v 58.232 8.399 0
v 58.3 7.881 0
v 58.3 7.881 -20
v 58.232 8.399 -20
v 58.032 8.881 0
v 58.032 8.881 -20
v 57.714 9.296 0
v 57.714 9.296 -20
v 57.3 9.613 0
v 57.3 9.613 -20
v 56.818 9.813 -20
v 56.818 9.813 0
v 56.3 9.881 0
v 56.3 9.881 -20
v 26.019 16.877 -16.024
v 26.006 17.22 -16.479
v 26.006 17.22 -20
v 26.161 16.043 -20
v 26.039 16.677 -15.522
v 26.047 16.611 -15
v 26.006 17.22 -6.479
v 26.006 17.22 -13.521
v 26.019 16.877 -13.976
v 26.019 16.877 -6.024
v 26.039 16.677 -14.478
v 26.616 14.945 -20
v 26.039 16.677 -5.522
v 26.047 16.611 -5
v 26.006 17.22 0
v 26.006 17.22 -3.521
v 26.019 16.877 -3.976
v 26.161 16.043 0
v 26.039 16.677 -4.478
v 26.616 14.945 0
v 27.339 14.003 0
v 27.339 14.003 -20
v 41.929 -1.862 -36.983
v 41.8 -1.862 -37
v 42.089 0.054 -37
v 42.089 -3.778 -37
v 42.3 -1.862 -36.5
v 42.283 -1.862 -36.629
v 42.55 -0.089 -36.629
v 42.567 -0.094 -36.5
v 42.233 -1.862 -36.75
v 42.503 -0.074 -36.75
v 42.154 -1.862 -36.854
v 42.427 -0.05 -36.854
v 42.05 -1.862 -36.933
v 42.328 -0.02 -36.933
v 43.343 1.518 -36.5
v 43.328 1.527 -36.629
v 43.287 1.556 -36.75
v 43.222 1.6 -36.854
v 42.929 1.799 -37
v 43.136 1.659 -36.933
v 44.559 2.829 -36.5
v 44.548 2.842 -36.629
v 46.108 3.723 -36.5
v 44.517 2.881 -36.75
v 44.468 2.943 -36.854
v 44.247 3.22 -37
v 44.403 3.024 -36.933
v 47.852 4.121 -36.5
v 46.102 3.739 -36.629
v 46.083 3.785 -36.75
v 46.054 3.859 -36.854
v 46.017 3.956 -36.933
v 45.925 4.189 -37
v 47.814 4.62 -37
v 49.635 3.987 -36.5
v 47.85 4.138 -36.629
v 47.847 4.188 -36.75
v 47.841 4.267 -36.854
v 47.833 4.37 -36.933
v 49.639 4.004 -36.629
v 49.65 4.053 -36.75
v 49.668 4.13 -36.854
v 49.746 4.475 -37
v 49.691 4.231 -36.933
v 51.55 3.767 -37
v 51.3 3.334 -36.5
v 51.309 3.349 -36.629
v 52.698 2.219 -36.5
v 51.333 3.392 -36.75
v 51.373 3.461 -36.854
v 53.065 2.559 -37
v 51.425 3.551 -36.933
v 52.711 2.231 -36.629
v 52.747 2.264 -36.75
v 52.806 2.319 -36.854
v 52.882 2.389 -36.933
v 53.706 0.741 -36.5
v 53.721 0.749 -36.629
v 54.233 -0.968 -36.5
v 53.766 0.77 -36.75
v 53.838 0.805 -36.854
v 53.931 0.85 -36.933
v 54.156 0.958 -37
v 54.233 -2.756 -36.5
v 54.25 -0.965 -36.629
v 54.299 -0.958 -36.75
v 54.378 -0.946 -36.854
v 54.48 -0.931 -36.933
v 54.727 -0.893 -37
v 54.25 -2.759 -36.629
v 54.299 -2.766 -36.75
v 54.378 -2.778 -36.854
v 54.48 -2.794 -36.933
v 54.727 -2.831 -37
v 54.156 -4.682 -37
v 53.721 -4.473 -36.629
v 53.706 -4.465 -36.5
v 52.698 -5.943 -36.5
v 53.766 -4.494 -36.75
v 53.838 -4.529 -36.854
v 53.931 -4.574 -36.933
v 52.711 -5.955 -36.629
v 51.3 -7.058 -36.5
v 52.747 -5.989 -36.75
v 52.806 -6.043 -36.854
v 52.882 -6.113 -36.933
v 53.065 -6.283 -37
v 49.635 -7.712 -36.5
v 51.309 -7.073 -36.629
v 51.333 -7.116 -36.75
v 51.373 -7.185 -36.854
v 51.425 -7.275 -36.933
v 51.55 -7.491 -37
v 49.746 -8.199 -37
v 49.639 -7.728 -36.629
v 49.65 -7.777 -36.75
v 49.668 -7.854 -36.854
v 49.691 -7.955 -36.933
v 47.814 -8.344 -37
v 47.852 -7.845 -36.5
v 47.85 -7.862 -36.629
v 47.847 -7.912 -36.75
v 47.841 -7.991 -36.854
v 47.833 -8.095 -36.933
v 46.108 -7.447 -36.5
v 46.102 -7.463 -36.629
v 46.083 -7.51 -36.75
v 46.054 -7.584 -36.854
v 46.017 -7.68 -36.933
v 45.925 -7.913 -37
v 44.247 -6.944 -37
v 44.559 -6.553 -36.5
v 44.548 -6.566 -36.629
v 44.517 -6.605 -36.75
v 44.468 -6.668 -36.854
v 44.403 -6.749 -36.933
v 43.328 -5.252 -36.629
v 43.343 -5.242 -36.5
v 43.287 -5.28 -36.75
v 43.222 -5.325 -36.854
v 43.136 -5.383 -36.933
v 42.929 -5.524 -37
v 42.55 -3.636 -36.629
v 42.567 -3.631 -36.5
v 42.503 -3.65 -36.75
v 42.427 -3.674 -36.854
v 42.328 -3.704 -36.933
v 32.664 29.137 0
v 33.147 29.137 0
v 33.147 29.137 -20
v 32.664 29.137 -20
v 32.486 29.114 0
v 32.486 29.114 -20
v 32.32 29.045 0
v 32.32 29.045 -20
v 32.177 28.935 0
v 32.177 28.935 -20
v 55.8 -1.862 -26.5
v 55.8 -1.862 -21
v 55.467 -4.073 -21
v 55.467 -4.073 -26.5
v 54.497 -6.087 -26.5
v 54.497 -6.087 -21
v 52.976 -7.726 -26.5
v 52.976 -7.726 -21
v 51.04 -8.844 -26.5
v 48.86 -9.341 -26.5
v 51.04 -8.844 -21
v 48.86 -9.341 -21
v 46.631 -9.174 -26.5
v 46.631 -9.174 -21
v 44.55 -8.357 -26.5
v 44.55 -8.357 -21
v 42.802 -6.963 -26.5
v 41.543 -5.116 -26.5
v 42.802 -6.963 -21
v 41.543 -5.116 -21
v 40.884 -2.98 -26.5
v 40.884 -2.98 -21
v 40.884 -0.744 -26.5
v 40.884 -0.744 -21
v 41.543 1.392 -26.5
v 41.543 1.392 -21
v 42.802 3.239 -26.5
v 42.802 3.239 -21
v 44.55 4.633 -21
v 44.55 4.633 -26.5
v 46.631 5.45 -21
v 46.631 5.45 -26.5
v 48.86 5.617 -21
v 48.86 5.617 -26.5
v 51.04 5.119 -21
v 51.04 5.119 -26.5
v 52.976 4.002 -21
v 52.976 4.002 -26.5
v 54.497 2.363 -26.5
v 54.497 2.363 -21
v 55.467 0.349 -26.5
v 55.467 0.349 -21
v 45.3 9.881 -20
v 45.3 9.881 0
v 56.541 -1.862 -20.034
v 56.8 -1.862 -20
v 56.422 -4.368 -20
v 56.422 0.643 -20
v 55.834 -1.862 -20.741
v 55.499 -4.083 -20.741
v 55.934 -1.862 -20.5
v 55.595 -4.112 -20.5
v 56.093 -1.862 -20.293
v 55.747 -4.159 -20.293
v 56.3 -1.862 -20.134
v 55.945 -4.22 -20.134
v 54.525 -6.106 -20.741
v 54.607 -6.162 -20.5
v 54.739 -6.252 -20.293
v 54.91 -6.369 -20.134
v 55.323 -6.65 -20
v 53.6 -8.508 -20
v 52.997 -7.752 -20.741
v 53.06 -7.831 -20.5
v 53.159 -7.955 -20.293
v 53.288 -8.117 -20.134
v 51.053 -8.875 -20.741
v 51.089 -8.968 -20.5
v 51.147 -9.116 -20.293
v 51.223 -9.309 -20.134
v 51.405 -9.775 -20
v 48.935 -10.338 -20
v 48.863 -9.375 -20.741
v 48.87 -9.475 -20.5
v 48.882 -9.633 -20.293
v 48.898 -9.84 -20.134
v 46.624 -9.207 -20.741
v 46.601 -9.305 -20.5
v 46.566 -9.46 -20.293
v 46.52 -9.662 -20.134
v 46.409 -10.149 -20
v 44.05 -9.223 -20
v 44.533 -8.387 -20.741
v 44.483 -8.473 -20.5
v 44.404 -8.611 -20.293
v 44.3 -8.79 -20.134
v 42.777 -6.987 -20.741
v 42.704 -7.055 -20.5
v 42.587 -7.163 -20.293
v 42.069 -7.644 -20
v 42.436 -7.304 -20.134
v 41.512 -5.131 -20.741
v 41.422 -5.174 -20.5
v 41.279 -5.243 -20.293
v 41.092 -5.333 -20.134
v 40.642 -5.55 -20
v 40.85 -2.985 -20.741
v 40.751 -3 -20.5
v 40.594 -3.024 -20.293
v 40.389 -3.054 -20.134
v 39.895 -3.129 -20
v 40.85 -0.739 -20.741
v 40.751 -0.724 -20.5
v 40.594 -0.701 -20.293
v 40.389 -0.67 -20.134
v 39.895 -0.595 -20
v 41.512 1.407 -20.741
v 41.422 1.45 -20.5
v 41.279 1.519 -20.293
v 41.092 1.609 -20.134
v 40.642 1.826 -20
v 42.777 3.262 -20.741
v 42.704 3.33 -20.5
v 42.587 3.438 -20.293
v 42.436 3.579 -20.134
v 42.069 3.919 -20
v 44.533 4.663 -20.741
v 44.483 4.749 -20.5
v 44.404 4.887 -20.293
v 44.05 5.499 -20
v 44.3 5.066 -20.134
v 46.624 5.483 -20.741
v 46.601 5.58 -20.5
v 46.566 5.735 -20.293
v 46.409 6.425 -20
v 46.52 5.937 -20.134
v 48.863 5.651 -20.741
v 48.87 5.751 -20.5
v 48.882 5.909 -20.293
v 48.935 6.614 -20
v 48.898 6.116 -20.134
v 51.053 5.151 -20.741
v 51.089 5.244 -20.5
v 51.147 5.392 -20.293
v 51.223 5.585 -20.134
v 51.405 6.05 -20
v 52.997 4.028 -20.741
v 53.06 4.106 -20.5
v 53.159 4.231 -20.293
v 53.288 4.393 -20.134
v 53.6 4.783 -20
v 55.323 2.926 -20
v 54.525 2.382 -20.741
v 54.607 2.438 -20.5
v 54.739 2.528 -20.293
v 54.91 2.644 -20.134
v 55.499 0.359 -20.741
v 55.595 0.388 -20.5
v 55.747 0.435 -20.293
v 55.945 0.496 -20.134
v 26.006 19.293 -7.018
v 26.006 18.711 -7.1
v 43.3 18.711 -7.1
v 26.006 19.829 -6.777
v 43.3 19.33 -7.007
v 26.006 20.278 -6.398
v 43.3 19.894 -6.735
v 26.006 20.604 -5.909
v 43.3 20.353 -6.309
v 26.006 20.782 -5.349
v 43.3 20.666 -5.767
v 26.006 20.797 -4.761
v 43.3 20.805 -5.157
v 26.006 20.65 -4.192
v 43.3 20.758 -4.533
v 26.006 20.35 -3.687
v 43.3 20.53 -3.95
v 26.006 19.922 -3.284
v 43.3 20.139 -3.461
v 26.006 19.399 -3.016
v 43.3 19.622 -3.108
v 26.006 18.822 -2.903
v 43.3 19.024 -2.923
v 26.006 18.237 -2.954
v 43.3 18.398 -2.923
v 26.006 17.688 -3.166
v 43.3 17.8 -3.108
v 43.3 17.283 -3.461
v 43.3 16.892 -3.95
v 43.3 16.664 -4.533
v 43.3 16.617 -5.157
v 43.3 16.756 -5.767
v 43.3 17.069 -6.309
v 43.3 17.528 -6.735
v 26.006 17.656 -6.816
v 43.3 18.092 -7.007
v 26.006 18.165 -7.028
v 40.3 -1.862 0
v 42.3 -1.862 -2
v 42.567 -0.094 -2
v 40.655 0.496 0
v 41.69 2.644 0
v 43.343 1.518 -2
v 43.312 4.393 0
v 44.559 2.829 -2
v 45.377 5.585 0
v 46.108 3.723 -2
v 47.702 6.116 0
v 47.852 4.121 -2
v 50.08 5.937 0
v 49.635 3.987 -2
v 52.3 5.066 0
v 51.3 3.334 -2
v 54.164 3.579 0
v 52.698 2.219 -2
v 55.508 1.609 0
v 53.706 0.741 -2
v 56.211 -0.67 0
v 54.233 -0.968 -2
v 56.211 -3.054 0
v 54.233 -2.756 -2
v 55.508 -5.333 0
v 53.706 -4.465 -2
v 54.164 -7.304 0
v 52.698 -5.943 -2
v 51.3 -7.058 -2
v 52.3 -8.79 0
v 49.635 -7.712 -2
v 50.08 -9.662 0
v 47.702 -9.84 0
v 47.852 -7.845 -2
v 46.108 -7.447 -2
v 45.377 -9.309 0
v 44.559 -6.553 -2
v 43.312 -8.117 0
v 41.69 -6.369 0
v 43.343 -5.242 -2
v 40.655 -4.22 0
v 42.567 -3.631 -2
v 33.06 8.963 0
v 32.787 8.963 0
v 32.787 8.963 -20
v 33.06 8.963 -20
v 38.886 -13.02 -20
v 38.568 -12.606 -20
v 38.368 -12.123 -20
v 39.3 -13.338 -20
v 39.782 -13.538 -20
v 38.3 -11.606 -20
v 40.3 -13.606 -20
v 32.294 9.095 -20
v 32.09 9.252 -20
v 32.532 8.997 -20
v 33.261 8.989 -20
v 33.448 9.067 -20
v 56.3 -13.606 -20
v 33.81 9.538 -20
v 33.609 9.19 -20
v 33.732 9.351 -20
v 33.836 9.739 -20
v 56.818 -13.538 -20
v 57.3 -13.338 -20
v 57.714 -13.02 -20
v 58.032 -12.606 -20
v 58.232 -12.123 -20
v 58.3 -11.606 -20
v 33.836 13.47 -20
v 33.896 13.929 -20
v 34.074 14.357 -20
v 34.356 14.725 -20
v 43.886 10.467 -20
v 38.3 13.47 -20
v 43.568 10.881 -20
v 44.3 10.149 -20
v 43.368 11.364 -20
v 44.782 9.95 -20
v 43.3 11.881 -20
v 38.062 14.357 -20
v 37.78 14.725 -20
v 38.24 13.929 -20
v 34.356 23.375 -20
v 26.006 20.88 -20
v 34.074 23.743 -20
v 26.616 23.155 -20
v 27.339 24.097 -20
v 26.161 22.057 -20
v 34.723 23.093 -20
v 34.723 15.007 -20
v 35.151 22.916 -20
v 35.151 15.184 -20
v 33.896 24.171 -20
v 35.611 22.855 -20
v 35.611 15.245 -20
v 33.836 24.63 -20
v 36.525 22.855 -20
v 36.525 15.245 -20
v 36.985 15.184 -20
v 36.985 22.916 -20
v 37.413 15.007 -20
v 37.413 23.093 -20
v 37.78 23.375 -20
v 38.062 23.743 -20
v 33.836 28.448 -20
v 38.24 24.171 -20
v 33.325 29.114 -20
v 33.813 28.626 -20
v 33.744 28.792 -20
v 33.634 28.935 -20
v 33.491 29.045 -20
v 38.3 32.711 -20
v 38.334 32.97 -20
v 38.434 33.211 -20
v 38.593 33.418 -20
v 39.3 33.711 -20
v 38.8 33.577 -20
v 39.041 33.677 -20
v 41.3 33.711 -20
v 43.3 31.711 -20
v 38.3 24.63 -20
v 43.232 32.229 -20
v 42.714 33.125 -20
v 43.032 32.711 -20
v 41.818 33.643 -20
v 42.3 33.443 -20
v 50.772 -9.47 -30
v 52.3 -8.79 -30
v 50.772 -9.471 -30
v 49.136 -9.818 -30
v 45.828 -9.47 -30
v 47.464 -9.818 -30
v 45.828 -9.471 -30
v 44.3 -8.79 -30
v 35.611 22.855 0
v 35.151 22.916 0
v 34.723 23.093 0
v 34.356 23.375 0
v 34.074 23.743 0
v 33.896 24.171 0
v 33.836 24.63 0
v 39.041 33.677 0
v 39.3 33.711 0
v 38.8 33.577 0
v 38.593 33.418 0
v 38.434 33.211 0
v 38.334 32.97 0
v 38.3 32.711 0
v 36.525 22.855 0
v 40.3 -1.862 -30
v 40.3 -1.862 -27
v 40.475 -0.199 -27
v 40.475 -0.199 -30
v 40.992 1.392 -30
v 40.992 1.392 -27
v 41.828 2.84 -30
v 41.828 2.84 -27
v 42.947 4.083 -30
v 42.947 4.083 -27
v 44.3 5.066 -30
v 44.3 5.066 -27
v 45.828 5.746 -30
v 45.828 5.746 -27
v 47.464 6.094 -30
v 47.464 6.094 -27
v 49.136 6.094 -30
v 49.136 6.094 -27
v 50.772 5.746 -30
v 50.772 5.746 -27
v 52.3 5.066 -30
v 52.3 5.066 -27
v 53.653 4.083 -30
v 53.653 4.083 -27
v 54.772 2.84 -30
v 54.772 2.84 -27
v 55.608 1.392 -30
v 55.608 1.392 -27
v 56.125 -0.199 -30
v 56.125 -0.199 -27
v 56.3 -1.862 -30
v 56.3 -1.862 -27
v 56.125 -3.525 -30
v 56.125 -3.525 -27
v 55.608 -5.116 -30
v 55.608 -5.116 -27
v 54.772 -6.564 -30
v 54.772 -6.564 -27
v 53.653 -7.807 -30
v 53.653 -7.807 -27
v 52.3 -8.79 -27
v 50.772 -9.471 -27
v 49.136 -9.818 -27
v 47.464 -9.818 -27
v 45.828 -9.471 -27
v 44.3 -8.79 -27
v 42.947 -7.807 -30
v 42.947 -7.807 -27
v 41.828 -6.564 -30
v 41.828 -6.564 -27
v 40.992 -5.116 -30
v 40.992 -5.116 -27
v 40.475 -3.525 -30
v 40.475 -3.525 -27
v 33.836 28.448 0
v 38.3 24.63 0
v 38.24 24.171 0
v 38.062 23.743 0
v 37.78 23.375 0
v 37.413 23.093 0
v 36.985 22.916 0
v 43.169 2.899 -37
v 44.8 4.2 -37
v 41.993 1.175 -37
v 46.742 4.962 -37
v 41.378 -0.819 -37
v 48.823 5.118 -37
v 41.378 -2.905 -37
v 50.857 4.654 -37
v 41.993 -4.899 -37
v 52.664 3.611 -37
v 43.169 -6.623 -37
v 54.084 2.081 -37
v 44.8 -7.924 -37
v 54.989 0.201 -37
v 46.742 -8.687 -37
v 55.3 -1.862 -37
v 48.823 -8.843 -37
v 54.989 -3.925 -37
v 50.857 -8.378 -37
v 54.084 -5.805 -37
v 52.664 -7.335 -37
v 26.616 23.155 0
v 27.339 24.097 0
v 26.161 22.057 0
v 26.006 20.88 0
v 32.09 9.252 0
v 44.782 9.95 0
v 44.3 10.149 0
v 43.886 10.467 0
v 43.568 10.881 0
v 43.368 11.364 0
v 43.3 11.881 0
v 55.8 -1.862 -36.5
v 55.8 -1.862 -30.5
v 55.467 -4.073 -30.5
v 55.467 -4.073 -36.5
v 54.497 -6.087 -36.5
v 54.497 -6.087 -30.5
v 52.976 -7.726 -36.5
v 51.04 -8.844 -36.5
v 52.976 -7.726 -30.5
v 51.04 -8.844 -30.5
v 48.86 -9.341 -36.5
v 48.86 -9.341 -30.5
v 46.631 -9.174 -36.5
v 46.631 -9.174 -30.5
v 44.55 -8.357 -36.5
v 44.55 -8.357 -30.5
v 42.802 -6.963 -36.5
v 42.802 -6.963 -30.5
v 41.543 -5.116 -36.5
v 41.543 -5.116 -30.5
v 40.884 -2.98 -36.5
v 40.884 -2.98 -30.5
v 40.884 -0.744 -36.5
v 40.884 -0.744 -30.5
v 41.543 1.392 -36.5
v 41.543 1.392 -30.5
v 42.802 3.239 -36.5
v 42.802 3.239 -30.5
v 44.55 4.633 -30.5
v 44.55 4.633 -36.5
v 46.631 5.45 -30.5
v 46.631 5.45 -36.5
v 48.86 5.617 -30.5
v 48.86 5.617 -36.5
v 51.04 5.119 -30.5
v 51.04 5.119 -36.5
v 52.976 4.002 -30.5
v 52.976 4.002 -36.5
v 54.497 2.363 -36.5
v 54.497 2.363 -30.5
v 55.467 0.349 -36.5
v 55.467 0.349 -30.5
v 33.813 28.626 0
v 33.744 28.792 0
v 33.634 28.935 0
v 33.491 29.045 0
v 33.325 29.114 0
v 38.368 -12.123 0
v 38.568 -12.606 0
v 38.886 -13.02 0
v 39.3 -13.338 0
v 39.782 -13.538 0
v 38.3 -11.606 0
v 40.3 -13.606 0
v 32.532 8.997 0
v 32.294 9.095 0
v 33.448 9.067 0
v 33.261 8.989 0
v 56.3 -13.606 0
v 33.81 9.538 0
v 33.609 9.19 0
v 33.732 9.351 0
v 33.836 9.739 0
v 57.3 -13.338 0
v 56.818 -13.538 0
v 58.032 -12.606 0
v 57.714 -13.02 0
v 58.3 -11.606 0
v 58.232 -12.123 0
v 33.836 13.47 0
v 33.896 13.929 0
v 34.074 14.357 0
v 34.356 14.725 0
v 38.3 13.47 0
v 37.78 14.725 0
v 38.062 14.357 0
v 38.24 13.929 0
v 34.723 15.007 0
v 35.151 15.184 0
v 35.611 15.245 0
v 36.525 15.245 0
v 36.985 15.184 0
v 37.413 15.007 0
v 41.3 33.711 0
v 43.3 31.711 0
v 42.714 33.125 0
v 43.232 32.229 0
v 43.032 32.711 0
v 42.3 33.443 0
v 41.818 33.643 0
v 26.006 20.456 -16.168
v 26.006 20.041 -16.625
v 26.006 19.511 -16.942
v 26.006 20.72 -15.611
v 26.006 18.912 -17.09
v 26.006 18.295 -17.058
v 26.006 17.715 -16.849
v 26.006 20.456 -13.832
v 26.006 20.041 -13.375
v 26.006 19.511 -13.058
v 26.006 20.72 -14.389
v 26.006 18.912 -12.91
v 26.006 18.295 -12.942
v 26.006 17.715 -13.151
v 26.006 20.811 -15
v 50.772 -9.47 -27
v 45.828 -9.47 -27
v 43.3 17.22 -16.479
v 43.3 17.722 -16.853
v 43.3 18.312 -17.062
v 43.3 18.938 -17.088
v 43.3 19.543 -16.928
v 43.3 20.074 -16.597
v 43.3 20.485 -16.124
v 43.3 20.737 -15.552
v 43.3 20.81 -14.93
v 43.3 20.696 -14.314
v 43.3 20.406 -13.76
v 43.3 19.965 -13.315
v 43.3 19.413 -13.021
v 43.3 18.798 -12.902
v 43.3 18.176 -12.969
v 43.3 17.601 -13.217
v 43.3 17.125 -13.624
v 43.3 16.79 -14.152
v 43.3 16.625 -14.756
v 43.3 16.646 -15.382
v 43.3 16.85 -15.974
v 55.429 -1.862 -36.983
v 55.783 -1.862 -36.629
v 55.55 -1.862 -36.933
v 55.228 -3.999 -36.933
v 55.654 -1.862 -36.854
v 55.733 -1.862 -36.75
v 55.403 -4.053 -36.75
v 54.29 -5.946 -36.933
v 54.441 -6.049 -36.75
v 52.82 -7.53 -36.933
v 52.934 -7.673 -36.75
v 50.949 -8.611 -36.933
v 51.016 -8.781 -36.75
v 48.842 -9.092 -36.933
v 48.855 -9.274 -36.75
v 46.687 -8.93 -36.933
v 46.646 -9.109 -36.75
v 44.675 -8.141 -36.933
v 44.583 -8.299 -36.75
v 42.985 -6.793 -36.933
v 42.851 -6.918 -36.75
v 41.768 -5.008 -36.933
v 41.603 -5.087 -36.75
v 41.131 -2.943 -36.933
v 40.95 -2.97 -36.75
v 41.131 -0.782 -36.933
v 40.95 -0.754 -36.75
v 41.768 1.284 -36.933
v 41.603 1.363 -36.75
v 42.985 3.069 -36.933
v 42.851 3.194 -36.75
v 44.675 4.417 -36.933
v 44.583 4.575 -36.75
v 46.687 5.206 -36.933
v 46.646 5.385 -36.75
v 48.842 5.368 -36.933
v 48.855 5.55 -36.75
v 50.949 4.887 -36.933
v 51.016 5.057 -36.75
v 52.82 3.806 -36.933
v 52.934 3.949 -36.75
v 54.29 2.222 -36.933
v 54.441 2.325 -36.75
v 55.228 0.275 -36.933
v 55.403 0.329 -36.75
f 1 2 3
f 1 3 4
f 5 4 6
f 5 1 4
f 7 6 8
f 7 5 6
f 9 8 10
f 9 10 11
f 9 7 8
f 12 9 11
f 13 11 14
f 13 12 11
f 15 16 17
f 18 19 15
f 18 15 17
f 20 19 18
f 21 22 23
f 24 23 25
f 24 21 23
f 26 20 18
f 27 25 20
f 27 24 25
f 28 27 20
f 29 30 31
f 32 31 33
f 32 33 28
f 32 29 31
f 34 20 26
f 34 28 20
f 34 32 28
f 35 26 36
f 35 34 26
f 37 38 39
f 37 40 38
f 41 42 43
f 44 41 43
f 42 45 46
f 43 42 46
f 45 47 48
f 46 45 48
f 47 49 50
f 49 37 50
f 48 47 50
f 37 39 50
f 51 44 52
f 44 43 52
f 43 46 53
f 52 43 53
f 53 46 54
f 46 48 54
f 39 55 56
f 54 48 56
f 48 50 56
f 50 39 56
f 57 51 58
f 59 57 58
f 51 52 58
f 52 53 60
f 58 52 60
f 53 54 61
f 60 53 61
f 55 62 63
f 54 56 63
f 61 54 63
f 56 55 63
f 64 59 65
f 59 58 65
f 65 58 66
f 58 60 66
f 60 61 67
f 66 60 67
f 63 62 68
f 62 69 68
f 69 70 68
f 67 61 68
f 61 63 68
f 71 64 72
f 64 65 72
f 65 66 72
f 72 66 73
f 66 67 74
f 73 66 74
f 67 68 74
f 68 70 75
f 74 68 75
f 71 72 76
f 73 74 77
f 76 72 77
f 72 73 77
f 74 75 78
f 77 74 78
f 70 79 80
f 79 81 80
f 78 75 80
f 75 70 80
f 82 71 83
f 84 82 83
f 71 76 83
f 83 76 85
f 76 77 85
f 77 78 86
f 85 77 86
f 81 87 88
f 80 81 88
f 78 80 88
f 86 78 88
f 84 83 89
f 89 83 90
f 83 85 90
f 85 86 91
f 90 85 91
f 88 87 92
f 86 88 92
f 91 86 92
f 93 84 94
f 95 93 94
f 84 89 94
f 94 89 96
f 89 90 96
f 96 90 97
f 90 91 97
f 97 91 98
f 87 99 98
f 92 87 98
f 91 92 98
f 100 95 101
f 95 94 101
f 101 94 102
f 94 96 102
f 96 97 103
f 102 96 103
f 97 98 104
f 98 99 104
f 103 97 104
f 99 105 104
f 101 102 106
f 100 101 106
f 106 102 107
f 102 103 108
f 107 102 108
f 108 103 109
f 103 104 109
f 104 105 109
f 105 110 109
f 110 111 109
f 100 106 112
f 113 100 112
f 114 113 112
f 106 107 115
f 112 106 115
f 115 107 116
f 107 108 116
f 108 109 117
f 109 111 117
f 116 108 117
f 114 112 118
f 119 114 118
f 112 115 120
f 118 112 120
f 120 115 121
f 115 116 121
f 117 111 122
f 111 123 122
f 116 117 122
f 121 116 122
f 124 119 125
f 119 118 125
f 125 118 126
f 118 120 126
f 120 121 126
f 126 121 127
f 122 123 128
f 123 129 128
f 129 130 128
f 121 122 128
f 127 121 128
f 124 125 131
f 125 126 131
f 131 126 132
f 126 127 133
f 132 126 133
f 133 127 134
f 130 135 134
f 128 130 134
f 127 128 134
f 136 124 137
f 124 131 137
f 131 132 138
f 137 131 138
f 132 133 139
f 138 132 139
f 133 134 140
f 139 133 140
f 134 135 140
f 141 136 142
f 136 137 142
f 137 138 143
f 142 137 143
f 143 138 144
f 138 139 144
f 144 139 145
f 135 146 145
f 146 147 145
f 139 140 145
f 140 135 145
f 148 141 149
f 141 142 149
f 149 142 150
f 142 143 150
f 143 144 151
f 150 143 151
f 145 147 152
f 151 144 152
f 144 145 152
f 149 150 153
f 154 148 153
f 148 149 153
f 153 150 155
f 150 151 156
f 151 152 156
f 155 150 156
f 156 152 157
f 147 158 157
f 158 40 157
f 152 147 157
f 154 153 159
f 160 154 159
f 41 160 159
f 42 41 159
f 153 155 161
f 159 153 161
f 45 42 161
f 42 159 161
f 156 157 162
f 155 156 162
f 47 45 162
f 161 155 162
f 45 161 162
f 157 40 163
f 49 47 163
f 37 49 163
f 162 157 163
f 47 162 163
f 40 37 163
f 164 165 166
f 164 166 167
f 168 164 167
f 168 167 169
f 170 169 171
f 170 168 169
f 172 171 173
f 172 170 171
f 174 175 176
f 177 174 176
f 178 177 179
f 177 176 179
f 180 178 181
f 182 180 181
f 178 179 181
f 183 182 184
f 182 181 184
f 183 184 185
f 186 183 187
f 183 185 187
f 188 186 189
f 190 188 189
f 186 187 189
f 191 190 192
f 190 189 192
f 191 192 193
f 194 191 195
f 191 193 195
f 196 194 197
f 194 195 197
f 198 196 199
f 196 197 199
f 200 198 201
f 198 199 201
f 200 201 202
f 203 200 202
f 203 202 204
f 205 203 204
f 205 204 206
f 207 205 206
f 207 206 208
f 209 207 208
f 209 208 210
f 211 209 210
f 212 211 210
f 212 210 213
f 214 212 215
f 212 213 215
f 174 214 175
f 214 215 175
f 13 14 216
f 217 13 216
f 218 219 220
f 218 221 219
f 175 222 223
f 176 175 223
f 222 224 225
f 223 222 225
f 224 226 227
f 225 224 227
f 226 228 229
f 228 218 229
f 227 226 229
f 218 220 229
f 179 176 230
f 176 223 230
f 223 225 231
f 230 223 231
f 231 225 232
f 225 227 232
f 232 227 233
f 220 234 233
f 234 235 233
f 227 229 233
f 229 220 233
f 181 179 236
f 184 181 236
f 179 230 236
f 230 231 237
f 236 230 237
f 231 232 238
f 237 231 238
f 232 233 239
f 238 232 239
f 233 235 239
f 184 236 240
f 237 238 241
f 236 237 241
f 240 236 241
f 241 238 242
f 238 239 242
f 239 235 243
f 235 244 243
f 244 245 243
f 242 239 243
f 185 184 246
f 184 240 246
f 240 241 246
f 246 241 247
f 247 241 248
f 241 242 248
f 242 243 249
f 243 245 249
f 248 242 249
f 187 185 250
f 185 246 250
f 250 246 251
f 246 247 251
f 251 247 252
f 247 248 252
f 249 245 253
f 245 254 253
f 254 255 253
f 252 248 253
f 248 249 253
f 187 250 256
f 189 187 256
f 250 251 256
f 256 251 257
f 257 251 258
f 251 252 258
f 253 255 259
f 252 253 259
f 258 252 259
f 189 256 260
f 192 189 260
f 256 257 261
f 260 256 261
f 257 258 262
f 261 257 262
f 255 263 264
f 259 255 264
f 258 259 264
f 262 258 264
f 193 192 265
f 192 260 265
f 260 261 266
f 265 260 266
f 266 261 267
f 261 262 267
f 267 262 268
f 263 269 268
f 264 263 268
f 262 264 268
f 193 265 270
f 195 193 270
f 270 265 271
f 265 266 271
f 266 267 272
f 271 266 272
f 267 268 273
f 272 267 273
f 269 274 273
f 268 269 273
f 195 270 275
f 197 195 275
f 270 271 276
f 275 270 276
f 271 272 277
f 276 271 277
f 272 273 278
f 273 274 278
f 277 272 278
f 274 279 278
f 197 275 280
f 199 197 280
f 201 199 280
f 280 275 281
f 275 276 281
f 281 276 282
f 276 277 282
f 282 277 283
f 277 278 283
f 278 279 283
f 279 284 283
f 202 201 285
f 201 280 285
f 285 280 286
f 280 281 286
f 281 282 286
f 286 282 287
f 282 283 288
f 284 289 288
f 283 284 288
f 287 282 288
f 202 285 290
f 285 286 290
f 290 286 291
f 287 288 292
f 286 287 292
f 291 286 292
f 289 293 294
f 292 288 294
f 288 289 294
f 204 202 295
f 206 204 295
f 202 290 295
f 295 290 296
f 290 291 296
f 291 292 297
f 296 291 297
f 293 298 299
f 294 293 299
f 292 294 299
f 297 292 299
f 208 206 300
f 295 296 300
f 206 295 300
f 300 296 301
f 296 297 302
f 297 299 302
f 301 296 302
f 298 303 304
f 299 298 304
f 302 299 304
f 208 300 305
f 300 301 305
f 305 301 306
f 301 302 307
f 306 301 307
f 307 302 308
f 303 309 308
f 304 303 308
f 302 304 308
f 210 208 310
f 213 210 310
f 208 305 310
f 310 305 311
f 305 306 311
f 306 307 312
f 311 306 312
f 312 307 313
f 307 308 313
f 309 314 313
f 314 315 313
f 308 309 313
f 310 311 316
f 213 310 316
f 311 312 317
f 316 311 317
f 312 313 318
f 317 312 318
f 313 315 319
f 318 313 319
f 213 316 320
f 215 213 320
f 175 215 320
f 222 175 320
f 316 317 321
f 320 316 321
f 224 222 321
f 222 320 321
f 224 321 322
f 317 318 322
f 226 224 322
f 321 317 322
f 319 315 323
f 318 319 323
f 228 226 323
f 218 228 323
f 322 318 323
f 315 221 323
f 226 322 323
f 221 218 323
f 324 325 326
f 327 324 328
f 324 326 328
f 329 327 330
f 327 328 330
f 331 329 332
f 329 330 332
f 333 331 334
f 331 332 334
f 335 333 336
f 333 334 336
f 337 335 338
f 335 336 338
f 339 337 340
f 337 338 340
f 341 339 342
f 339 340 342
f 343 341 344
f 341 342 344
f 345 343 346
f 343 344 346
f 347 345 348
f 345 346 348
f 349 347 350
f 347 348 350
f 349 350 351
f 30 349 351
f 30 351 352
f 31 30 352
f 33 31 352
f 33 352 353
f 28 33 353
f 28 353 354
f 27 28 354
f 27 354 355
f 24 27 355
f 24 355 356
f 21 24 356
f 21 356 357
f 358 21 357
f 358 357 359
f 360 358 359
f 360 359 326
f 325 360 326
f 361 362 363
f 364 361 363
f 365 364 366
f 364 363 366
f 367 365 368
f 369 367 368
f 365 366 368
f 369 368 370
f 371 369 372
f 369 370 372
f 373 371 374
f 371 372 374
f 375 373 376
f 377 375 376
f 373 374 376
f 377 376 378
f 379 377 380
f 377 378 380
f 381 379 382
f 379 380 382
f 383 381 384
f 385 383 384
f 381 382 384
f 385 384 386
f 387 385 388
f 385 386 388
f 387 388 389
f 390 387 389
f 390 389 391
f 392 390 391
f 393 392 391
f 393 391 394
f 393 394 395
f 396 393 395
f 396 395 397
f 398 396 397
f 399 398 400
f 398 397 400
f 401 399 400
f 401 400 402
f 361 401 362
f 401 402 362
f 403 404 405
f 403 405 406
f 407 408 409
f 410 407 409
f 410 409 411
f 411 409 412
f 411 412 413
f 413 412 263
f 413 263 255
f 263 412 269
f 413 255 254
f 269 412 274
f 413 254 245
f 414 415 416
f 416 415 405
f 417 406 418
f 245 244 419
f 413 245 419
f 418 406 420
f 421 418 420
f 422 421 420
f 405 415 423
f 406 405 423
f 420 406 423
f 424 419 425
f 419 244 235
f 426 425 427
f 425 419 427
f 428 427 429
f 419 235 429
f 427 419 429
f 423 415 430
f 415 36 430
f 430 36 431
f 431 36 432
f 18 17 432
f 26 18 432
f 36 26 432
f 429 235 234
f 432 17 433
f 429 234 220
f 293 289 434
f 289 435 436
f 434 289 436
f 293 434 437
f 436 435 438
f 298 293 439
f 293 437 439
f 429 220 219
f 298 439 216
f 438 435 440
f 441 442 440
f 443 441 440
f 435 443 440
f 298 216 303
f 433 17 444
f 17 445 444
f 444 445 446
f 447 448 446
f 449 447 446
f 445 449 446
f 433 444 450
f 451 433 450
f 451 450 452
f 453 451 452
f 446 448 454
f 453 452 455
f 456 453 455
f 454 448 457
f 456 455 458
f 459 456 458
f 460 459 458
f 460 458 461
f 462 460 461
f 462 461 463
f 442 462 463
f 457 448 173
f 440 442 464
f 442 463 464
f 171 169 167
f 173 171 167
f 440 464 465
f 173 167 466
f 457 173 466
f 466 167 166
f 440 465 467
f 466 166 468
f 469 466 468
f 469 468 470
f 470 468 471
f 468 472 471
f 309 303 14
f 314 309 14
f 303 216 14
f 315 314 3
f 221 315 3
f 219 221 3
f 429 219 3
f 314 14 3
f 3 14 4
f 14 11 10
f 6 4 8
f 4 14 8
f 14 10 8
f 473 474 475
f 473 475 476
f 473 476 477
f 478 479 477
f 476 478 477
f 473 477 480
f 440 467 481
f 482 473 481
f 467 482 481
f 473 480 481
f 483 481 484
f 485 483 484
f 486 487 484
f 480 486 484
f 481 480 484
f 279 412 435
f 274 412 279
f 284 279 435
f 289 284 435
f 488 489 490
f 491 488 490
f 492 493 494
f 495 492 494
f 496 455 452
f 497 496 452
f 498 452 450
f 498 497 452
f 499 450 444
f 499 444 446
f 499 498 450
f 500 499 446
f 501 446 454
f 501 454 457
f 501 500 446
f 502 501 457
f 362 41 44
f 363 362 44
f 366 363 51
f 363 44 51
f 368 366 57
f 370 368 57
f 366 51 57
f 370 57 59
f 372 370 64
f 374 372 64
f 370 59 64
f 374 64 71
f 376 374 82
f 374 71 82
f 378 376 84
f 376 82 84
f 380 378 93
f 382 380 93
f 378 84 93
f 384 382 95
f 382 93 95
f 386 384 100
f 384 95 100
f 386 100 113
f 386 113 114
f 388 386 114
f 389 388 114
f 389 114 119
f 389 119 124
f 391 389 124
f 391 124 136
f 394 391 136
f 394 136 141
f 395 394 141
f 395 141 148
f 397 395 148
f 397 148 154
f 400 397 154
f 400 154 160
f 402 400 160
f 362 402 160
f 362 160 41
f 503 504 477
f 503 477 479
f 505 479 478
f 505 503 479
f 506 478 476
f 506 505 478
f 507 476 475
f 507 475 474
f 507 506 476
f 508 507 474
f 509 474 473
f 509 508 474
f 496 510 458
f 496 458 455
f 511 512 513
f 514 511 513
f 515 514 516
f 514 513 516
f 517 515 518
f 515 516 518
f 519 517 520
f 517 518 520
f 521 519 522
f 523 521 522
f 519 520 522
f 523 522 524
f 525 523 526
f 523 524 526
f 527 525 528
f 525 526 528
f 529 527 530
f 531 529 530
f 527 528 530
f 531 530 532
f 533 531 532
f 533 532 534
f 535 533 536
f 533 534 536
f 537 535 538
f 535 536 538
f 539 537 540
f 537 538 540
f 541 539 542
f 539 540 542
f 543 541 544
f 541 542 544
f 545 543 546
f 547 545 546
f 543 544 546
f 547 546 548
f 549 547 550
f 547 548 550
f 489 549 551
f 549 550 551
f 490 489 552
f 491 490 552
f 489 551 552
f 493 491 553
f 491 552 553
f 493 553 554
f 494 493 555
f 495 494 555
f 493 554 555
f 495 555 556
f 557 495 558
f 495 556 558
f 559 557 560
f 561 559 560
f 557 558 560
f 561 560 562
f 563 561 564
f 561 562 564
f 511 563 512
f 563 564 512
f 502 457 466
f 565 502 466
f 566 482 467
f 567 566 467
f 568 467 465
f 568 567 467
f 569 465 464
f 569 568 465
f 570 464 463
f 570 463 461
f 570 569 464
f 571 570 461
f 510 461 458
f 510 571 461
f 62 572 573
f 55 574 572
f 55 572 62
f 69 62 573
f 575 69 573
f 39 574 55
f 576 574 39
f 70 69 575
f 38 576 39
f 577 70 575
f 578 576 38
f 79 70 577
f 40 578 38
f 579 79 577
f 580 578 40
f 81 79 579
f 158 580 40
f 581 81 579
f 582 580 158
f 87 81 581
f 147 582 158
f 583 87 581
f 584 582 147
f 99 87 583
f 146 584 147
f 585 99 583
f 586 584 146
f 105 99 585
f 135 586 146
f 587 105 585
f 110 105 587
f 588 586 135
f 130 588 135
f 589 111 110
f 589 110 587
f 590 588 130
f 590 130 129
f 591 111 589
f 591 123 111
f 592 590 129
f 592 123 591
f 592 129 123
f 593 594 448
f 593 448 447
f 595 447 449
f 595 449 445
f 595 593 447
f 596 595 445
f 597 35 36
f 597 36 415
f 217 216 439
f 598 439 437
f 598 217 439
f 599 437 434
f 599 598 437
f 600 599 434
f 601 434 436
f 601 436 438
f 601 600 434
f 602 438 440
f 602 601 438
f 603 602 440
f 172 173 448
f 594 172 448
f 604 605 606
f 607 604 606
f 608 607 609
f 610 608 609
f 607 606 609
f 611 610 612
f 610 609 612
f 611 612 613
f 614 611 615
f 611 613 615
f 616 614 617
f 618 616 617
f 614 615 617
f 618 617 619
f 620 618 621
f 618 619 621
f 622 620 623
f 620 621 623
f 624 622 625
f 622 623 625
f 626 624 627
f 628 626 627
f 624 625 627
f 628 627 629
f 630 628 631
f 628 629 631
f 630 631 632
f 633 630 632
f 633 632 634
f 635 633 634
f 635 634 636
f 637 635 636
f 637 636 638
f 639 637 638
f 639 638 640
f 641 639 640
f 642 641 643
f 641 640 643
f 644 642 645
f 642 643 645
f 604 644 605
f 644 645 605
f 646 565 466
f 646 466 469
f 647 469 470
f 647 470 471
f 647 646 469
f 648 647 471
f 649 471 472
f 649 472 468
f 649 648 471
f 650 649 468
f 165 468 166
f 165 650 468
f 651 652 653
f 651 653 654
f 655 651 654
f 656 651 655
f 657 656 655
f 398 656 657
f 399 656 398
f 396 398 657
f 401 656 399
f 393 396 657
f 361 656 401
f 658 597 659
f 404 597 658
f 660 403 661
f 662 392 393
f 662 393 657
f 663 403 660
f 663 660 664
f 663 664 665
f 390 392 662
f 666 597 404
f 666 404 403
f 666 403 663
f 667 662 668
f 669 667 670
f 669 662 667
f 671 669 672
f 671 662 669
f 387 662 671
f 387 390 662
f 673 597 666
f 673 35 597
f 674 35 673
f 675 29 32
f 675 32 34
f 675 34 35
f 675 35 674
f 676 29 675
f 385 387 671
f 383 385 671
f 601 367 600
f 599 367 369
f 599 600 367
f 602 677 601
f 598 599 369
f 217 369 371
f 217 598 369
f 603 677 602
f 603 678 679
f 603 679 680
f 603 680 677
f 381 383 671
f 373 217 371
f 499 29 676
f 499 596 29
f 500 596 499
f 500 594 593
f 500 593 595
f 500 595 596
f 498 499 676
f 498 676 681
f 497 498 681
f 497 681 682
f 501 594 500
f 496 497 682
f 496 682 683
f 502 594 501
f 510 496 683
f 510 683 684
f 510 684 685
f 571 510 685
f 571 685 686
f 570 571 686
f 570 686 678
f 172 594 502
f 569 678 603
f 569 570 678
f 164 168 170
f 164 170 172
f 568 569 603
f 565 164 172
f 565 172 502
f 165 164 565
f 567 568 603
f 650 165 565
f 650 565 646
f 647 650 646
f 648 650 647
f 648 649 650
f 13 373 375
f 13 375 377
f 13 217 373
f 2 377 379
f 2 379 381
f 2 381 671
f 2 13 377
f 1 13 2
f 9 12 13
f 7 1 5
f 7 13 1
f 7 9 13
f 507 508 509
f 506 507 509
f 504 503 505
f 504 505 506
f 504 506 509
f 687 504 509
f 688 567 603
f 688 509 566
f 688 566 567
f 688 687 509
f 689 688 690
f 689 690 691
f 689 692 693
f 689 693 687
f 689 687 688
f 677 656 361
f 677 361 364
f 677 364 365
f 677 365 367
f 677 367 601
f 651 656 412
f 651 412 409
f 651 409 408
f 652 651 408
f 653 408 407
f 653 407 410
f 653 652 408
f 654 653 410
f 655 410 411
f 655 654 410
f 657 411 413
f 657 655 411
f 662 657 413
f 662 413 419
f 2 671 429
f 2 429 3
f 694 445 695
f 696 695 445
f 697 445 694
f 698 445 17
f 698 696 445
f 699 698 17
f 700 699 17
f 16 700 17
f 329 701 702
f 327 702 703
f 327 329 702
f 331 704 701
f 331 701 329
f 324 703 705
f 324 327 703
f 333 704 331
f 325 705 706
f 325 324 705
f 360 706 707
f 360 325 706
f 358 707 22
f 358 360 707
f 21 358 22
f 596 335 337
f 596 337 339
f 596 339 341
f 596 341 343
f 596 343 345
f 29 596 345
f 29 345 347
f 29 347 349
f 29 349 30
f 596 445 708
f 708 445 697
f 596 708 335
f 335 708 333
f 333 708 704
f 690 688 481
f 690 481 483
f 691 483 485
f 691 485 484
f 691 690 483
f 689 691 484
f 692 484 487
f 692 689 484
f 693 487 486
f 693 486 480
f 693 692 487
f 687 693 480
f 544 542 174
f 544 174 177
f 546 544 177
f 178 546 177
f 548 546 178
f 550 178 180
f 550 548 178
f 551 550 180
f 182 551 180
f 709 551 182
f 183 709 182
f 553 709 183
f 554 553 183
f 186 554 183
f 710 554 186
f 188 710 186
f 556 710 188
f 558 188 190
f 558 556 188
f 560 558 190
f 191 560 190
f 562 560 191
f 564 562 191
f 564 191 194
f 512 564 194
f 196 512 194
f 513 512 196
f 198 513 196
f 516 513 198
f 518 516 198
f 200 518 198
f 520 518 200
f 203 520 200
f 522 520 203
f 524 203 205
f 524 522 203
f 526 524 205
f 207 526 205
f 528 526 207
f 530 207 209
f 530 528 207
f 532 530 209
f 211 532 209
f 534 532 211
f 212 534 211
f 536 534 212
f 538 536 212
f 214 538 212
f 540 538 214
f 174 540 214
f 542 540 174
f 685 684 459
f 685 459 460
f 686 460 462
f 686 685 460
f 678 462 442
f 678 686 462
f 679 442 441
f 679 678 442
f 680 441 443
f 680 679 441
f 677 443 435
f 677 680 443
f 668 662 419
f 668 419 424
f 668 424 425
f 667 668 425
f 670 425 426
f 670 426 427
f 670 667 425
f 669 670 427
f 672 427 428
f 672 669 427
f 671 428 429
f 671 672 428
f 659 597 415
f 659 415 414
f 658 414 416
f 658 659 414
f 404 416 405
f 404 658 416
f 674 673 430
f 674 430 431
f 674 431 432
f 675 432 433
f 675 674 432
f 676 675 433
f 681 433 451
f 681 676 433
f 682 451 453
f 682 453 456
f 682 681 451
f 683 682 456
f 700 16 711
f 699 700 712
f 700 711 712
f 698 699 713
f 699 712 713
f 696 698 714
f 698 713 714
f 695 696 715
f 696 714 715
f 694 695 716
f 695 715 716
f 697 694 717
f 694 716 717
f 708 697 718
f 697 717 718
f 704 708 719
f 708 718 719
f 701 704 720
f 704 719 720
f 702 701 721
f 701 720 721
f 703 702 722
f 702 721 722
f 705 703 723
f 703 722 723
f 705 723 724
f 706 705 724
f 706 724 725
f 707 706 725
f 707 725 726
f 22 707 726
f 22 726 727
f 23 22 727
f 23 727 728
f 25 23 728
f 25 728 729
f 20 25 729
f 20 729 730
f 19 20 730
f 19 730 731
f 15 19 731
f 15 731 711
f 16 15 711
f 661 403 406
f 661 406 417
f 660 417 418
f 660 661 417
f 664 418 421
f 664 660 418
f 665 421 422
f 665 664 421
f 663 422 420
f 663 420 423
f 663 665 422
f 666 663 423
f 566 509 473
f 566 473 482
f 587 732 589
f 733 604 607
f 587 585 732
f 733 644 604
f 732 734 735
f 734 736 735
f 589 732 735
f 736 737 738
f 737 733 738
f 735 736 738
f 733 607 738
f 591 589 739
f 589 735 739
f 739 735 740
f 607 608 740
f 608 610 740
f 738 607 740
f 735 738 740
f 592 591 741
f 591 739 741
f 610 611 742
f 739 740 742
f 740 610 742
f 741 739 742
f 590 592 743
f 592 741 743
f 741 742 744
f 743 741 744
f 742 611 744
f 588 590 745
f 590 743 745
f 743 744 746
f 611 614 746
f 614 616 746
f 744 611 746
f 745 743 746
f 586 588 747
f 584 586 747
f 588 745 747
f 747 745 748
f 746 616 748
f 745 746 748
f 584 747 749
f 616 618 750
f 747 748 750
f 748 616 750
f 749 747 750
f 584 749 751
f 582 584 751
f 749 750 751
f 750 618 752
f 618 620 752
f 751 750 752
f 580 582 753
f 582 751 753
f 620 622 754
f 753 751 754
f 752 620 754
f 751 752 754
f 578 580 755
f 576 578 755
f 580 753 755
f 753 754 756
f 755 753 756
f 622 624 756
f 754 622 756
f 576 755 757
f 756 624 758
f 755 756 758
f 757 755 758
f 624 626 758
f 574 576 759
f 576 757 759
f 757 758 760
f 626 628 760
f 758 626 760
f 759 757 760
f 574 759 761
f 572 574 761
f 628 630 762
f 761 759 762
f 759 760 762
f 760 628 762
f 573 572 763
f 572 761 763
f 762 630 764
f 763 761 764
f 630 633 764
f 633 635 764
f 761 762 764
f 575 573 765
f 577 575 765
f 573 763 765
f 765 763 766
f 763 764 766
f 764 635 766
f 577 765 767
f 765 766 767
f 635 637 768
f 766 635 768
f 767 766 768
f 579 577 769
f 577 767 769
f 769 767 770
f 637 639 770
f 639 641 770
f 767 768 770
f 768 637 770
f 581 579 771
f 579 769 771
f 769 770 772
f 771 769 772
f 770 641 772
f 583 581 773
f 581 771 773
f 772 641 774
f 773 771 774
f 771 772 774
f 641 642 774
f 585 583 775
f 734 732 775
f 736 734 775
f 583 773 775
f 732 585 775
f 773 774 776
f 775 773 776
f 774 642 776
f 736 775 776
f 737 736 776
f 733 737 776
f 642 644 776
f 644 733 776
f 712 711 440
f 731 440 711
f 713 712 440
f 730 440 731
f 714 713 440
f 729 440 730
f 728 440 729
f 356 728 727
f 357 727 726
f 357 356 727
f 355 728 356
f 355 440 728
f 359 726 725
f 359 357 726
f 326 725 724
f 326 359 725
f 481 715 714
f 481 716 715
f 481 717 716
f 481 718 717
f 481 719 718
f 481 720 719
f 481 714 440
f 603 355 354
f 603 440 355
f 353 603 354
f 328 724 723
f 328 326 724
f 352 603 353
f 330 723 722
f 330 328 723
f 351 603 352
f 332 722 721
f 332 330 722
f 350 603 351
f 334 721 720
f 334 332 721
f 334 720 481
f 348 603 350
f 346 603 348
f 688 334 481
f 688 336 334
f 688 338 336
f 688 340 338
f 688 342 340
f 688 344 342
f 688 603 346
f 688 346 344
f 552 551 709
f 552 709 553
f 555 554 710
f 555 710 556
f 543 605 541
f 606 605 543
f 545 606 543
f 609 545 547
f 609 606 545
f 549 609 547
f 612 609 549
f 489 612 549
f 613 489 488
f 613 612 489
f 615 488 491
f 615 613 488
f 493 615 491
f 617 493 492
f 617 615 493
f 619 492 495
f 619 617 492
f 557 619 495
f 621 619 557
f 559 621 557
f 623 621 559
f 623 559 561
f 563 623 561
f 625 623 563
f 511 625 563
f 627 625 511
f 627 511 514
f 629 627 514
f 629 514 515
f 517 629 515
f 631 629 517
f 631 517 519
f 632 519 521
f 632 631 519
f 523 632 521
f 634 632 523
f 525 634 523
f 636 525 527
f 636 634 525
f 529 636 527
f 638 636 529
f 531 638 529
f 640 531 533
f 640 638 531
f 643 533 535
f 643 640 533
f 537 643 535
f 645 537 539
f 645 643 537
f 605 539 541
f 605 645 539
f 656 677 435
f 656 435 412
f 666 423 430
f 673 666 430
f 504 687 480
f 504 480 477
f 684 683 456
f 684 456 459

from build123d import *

# Parameters (mm, degrees)
BOSS_EXTRUDE1_DEPTH = 20
SKETCH3_R           = 2.1
CUT_EXTRUDE1_DEPTH  = 43.842719799
SKETCH4_R           = 7.5
BOSS_EXTRUDE2_DEPTH = 7
SKETCH5_R           = 8
BOSS_EXTRUDE3_DEPTH = 3
SKETCH6_R           = 7.5
BOSS_EXTRUDE4_DEPTH = 7
SKETCH7_R           = 6
CUT_EXTRUDE2_DEPTH  = 77.839573439
FILLET1_R           = 1
CHAMFER1_SIZE       = 0.5
CHAMFER2_SIZE       = 2
FILLET2_R           = 0.5


with BuildPart() as part:
    # Sketch1 → Boss-Extrude1 (new body)
    with BuildSketch(Plane.XY):
        with BuildLine():
            Line((38.3, 10.745623604), (38.3, 9.881410941))
            Line((38.3, 9.881410941), (38.3, 5.394343623))
            Line((38.3, 5.394343623), (38.3, -11.605656377))
            ThreePointArc((38.3, -11.605656377), (38.885786438, -13.01986994), (40.3, -13.605656377))
            Line((40.3, -13.605656377), (51.3, -13.605656377))
            Line((51.3, -13.605656377), (56.3, -13.605656377))
            ThreePointArc((56.3, -13.605656377), (57.714213562, -13.01986994), (58.3, -11.605656377))
            Line((58.3, -11.605656377), (58.3, 7.881410941))
            ThreePointArc((58.3, 7.881410941), (57.714213562, 9.295624503), (56.3, 9.881410941))
            Line((56.3, 9.881410941), (45.3, 9.881410941))
            ThreePointArc((45.3, 9.881410941), (43.885786438, 10.467197379), (43.3, 11.881410941))
            Line((43.3, 11.881410941), (43.3, 31.710978016))
            ThreePointArc((43.3, 31.710978016), (42.714213562, 33.125191579), (41.3, 33.710978016))
            Line((41.3, 33.710978016), (39.3, 33.710978016))
            ThreePointArc((39.3, 33.710978016), (38.592893219, 33.418084798), (38.3, 32.710978016))
            Line((38.3, 32.710978016), (38.3, 28.215588568))
            Line((38.3, 28.215588568), (38.3, 27.353495632))
            Line((38.3, 27.353495632), (38.3, 24.630195866))
            ThreePointArc((38.3, 24.630195866), (37.780173169, 23.37522288), (36.525200183, 22.855396049))
            Line((36.525200183, 22.855396049), (35.6108, 22.855396049))
            ThreePointArc((35.6108, 22.855396049), (34.355826885, 23.375222934), (33.836, 24.630196049))
            Line((33.836, 24.630196049), (33.836, 28.448))
            ThreePointArc((33.836, 28.448), (33.634196572, 28.935196572), (33.147, 29.137))
            Line((33.147, 29.137), (32.664287242, 29.137))
            ThreePointArc((32.664287242, 29.137), (32.400617966, 29.084552836), (32.177090071, 28.935195973))
            Line((32.177090071, 28.935195973), (27.33900161, 24.097095612))
            ThreePointArc((27.33900161, 24.097095612), (26.352731832, 22.621035632), (26.0064, 20.879905136))
            Line((26.0064, 20.879905136), (26.0064, 17.220094864))
            ThreePointArc((26.0064, 17.220094864), (26.352731832, 15.478964368), (27.33900161, 14.002904388))
            Line((27.33900161, 14.002904388), (32.090366071, 9.25152824))
            ThreePointArc((32.090366071, 9.25152824), (32.409953896, 9.037986056), (32.786933649, 8.963))
            Line((32.786933649, 8.963), (33.060275787, 8.963))
            ThreePointArc((33.060275787, 8.963), (33.608795638, 9.190204362), (33.836, 9.738724213))
            Line((33.836, 9.738724213), (33.836, 13.469803585))
            ThreePointArc((33.836, 13.469803585), (34.355826992, 14.724776959), (35.610800366, 15.244603951))
            Line((35.610800366, 15.244603951), (36.5252, 15.244603951))
            ThreePointArc((36.5252, 15.244603951), (37.780173115, 14.724777066), (38.3, 13.469803951))
            Line((38.3, 13.469803951), (38.3, 10.745623604))
        make_face()
    extrude(amount=-BOSS_EXTRUDE1_DEPTH)

    # Sketch3 → Cut-Extrude1 (cut, through all)
    with BuildSketch(Plane(origin=(43.3, 0, 0), x_dir=(0, 0, -1), z_dir=(1, 0, 0))):
        with Locations((5, 18.710978016)):
            Circle(SKETCH3_R)
        with Locations(Location((15, 18.710978016, 0), (0, 0, 314.769611651))):
            Circle(SKETCH3_R)
    extrude(amount=-CUT_EXTRUDE1_DEPTH, mode=Mode.SUBTRACT)

    # Sketch4 → Boss-Extrude2 (add)
    with BuildSketch(Plane(origin=(0, 0, -20), x_dir=(-1, 0, 0), z_dir=(0, 0, -1))):
        with Locations(Location((-48.3, -1.862122718, 0), (0, 0, 180))):
            Circle(SKETCH4_R)
    extrude(amount=BOSS_EXTRUDE2_DEPTH)

    # Sketch5 → Boss-Extrude3 (add)
    with BuildSketch(Plane(origin=(0, 0, -27), x_dir=(-1, 0, 0), z_dir=(0, 0, -1))):
        with Locations((-48.3, -1.862122718)):
            Circle(SKETCH5_R)
    extrude(amount=BOSS_EXTRUDE3_DEPTH)

    # Sketch6 → Boss-Extrude4 (add)
    with BuildSketch(Plane(origin=(0, 0, -30), x_dir=(-1, 0, 0), z_dir=(0, 0, -1))):
        with Locations(Location((-48.3, -1.862122718, 0), (0, 0, 180))):
            Circle(SKETCH6_R)
    extrude(amount=BOSS_EXTRUDE4_DEPTH)

    # Sketch7 → Cut-Extrude2 (cut, through all)
    with BuildSketch(Plane(origin=(0, 0, -37), x_dir=(-1, 0, 0), z_dir=(0, 0, -1))):
        with Locations((-48.3, -1.862122718)):
            Circle(SKETCH7_R)
    extrude(amount=-CUT_EXTRUDE2_DEPTH, mode=Mode.SUBTRACT)

    # Fillet1
    fillet1_edges = [part.edges().sort_by_distance(p)[0] for p in [
        (40.8, -1.862122718, -20),
    ]]
    fillet(fillet1_edges, radius=FILLET1_R)

    # Chamfer1
    chamfer1_edges = [part.edges().sort_by_distance(p)[0] for p in [
        (40.8, -1.862122718, -27),
        (40.8, -1.862122718, -30),
    ]]
    chamfer(chamfer1_edges, length=CHAMFER1_SIZE - 0.0001)  # a hair under: the kernel refuses the full size

    # Chamfer2
    chamfer2_edges = [part.edges().sort_by_distance(p)[0] for p in [
        (54.3, -1.862122718, 0),
    ]]
    chamfer(chamfer2_edges, length=CHAMFER2_SIZE)

    # Fillet2
    fillet2_edges = [part.edges().sort_by_distance(p)[0] for p in [
        (40.8, -1.862122718, -37),
        (54.3, -1.862122718, -37),
    ]]
    fillet(fillet2_edges, radius=FILLET2_R)


solid = part.part
